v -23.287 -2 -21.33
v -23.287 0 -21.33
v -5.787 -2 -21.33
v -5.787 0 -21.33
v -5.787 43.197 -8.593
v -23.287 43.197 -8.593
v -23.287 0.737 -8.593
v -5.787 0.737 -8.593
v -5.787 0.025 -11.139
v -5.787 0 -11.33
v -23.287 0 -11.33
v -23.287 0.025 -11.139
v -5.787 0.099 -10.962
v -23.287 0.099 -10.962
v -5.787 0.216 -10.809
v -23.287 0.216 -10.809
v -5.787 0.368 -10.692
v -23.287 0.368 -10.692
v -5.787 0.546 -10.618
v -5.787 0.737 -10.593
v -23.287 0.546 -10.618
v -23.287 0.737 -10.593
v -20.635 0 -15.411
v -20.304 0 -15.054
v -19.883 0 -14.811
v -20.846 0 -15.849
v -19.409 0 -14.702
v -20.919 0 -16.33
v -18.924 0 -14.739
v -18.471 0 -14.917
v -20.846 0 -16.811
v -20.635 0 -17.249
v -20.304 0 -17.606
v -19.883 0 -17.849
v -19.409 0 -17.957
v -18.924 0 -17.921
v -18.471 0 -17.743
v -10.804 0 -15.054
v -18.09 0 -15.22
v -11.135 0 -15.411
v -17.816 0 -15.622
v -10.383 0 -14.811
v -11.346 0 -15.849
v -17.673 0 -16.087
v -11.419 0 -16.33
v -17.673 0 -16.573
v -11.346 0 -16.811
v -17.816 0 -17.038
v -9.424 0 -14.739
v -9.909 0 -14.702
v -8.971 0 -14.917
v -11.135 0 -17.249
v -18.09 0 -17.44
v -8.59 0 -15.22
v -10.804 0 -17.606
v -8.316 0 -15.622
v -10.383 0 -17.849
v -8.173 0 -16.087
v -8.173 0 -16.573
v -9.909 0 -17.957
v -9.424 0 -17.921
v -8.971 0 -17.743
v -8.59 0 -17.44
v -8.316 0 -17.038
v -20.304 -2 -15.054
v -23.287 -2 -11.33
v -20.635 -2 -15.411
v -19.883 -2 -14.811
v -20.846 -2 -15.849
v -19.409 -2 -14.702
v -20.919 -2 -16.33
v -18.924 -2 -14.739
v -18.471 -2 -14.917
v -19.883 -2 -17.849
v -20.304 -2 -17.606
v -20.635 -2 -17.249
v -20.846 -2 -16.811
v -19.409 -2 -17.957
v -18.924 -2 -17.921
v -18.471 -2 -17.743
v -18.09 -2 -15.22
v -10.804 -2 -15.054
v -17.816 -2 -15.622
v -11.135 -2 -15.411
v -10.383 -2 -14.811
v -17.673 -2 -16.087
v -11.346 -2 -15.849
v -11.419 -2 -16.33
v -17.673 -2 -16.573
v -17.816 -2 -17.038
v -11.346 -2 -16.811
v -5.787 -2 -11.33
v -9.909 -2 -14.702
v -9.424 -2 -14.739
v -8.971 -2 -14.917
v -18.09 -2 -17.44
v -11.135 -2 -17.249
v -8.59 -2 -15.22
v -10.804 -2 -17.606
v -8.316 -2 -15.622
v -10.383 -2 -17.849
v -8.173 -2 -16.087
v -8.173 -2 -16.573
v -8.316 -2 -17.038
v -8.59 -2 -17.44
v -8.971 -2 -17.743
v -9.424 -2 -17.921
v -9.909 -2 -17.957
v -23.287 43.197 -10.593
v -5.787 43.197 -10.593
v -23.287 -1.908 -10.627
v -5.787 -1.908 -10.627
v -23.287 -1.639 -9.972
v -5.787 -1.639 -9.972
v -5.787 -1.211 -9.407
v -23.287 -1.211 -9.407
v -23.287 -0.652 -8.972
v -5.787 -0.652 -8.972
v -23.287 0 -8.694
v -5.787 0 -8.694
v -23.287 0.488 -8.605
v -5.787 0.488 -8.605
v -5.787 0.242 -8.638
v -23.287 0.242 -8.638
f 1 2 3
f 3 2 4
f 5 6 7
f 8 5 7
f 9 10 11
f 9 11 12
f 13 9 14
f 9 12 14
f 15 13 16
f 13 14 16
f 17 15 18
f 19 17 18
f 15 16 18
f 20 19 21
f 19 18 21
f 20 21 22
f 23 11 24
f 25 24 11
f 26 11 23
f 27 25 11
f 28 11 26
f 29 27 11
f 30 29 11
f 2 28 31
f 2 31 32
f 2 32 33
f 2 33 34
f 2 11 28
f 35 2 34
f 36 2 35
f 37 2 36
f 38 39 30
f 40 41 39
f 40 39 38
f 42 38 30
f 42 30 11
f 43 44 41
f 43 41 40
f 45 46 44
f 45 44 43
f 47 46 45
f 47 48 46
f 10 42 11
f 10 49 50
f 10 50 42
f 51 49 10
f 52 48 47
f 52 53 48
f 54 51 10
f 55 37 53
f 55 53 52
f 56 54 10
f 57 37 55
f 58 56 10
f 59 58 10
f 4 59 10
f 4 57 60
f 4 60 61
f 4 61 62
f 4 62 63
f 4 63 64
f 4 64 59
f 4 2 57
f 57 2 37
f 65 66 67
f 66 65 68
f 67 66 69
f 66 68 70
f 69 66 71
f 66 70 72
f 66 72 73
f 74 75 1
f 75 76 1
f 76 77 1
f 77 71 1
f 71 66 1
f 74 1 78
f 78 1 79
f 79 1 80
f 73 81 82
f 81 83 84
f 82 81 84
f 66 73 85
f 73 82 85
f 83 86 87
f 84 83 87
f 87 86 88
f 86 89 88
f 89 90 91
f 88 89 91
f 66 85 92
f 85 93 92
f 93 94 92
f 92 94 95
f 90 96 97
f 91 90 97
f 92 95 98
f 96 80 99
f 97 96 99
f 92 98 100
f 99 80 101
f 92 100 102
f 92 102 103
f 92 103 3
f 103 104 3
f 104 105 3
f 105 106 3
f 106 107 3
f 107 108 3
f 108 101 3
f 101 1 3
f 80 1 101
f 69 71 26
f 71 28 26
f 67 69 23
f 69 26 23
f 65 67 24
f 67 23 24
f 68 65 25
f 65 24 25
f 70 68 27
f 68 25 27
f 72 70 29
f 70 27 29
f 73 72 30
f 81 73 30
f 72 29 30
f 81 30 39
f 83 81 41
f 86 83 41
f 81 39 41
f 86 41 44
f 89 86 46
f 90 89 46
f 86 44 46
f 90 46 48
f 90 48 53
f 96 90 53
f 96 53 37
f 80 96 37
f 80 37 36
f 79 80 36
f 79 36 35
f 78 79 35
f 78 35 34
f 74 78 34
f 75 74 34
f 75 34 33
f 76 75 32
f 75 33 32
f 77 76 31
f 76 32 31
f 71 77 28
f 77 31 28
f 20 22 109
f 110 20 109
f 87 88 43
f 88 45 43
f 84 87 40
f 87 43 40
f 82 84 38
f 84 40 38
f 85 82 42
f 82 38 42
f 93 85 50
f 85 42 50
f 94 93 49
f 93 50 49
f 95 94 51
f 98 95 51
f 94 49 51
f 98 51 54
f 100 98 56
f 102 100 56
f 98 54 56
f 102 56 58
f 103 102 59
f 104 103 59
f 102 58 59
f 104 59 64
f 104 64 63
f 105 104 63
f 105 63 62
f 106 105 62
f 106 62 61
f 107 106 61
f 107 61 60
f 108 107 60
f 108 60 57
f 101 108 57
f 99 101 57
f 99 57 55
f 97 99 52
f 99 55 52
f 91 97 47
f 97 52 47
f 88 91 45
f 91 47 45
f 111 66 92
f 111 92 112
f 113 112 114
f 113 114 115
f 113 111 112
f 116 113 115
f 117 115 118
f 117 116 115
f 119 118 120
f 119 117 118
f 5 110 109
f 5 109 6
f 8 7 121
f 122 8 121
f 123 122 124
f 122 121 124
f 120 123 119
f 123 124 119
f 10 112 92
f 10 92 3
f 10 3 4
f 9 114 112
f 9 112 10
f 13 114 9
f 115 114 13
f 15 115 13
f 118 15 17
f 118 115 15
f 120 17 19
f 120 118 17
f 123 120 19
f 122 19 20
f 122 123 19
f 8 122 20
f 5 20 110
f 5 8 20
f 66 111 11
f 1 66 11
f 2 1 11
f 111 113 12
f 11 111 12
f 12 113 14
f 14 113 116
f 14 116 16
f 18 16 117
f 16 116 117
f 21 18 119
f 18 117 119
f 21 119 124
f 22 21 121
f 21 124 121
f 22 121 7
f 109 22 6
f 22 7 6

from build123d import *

# Parameters (mm, degrees)
SKETCH1_W                 = 17.5
SKETCH1_H                 = 55
BASE_FLANGE1_DEPTH        = 2
SKETCHED_START            = -23.286713287
SKETCHED_BEND3_DEPTH      = 17.5
SKETCHED_BEND3_2_DEPTH    = 17.5
F_4_CLEARANCE_HOLE1_D     = 3.2639
F_4_CLEARANCE_HOLE1_DEPTH = 2
F_4_CLEARANCE_HOLE1_TIP   = 0.980574487


# Read off the part's stored shape, not the designer's step: Sketched Bend3
# Sheet-metal steps are written as plain solids
with BuildPart() as part:
    # Sketch1 → Base-Flange1 (new body)
    with BuildSketch(Plane(origin=(0, 0, 0), x_dir=(1, 0, 0), z_dir=(0, 1, 0))):
        with Locations((-14.536713287, -6.17016317)):
            Rectangle(SKETCH1_W, SKETCH1_H)
    extrude(amount=-BASE_FLANGE1_DEPTH)

    # Sketched Bend3 outline → Sketched Bend3 (cut)
    with BuildSketch(Plane.YZ.offset(SKETCHED_START)):
        with BuildLine():
            ThreePointArc((-2, -11.32983683), (-1.443395312, -9.675569621), (0, -8.694234432))
            Line((0, -8.694234432), (0, 33.67016317))
            Line((0, 33.67016317), (-2, 33.67016317))
            Line((-2, 33.67016317), (-2, -11.32983683))
        make_face()
    extrude(amount=SKETCHED_BEND3_DEPTH, mode=Mode.SUBTRACT)

    # Sketched Bend3 2 outline → Sketched Bend3 2 (add)
    with BuildSketch(Plane.YZ.offset(SKETCHED_START)):
        with BuildLine():
            ThreePointArc((0, -11.32983683), (0.215745145, -10.808981975), (0.7366, -10.59323683))
            Line((0.7366, -10.59323683), (43.197250658, -10.59323683))
            Line((43.197250658, -10.59323683), (43.197250658, -8.59323683))
            Line((43.197250658, -8.59323683), (0.7366, -8.59323683))
            ThreePointArc((0.7366, -8.59323683), (0.364854094, -8.6186038), (0, -8.694234432))
            Line((0, -8.694234432), (0, -11.32983683))
        make_face()
    extrude(amount=SKETCHED_BEND3_2_DEPTH)

    # #4 Clearance Hole1
    with Locations(Plane.XZ.offset(2)):
        with Locations((-9.786713287, -16.32983683), (-19.286713287, -16.32983683)):
            Hole(F_4_CLEARANCE_HOLE1_D / 2, depth=F_4_CLEARANCE_HOLE1_DEPTH)
            with Locations((0, 0, -(F_4_CLEARANCE_HOLE1_DEPTH + F_4_CLEARANCE_HOLE1_TIP / 2))):  # 118° drill point
                Cone(0, F_4_CLEARANCE_HOLE1_D / 2, F_4_CLEARANCE_HOLE1_TIP, mode=Mode.SUBTRACT)


solid = part.part
